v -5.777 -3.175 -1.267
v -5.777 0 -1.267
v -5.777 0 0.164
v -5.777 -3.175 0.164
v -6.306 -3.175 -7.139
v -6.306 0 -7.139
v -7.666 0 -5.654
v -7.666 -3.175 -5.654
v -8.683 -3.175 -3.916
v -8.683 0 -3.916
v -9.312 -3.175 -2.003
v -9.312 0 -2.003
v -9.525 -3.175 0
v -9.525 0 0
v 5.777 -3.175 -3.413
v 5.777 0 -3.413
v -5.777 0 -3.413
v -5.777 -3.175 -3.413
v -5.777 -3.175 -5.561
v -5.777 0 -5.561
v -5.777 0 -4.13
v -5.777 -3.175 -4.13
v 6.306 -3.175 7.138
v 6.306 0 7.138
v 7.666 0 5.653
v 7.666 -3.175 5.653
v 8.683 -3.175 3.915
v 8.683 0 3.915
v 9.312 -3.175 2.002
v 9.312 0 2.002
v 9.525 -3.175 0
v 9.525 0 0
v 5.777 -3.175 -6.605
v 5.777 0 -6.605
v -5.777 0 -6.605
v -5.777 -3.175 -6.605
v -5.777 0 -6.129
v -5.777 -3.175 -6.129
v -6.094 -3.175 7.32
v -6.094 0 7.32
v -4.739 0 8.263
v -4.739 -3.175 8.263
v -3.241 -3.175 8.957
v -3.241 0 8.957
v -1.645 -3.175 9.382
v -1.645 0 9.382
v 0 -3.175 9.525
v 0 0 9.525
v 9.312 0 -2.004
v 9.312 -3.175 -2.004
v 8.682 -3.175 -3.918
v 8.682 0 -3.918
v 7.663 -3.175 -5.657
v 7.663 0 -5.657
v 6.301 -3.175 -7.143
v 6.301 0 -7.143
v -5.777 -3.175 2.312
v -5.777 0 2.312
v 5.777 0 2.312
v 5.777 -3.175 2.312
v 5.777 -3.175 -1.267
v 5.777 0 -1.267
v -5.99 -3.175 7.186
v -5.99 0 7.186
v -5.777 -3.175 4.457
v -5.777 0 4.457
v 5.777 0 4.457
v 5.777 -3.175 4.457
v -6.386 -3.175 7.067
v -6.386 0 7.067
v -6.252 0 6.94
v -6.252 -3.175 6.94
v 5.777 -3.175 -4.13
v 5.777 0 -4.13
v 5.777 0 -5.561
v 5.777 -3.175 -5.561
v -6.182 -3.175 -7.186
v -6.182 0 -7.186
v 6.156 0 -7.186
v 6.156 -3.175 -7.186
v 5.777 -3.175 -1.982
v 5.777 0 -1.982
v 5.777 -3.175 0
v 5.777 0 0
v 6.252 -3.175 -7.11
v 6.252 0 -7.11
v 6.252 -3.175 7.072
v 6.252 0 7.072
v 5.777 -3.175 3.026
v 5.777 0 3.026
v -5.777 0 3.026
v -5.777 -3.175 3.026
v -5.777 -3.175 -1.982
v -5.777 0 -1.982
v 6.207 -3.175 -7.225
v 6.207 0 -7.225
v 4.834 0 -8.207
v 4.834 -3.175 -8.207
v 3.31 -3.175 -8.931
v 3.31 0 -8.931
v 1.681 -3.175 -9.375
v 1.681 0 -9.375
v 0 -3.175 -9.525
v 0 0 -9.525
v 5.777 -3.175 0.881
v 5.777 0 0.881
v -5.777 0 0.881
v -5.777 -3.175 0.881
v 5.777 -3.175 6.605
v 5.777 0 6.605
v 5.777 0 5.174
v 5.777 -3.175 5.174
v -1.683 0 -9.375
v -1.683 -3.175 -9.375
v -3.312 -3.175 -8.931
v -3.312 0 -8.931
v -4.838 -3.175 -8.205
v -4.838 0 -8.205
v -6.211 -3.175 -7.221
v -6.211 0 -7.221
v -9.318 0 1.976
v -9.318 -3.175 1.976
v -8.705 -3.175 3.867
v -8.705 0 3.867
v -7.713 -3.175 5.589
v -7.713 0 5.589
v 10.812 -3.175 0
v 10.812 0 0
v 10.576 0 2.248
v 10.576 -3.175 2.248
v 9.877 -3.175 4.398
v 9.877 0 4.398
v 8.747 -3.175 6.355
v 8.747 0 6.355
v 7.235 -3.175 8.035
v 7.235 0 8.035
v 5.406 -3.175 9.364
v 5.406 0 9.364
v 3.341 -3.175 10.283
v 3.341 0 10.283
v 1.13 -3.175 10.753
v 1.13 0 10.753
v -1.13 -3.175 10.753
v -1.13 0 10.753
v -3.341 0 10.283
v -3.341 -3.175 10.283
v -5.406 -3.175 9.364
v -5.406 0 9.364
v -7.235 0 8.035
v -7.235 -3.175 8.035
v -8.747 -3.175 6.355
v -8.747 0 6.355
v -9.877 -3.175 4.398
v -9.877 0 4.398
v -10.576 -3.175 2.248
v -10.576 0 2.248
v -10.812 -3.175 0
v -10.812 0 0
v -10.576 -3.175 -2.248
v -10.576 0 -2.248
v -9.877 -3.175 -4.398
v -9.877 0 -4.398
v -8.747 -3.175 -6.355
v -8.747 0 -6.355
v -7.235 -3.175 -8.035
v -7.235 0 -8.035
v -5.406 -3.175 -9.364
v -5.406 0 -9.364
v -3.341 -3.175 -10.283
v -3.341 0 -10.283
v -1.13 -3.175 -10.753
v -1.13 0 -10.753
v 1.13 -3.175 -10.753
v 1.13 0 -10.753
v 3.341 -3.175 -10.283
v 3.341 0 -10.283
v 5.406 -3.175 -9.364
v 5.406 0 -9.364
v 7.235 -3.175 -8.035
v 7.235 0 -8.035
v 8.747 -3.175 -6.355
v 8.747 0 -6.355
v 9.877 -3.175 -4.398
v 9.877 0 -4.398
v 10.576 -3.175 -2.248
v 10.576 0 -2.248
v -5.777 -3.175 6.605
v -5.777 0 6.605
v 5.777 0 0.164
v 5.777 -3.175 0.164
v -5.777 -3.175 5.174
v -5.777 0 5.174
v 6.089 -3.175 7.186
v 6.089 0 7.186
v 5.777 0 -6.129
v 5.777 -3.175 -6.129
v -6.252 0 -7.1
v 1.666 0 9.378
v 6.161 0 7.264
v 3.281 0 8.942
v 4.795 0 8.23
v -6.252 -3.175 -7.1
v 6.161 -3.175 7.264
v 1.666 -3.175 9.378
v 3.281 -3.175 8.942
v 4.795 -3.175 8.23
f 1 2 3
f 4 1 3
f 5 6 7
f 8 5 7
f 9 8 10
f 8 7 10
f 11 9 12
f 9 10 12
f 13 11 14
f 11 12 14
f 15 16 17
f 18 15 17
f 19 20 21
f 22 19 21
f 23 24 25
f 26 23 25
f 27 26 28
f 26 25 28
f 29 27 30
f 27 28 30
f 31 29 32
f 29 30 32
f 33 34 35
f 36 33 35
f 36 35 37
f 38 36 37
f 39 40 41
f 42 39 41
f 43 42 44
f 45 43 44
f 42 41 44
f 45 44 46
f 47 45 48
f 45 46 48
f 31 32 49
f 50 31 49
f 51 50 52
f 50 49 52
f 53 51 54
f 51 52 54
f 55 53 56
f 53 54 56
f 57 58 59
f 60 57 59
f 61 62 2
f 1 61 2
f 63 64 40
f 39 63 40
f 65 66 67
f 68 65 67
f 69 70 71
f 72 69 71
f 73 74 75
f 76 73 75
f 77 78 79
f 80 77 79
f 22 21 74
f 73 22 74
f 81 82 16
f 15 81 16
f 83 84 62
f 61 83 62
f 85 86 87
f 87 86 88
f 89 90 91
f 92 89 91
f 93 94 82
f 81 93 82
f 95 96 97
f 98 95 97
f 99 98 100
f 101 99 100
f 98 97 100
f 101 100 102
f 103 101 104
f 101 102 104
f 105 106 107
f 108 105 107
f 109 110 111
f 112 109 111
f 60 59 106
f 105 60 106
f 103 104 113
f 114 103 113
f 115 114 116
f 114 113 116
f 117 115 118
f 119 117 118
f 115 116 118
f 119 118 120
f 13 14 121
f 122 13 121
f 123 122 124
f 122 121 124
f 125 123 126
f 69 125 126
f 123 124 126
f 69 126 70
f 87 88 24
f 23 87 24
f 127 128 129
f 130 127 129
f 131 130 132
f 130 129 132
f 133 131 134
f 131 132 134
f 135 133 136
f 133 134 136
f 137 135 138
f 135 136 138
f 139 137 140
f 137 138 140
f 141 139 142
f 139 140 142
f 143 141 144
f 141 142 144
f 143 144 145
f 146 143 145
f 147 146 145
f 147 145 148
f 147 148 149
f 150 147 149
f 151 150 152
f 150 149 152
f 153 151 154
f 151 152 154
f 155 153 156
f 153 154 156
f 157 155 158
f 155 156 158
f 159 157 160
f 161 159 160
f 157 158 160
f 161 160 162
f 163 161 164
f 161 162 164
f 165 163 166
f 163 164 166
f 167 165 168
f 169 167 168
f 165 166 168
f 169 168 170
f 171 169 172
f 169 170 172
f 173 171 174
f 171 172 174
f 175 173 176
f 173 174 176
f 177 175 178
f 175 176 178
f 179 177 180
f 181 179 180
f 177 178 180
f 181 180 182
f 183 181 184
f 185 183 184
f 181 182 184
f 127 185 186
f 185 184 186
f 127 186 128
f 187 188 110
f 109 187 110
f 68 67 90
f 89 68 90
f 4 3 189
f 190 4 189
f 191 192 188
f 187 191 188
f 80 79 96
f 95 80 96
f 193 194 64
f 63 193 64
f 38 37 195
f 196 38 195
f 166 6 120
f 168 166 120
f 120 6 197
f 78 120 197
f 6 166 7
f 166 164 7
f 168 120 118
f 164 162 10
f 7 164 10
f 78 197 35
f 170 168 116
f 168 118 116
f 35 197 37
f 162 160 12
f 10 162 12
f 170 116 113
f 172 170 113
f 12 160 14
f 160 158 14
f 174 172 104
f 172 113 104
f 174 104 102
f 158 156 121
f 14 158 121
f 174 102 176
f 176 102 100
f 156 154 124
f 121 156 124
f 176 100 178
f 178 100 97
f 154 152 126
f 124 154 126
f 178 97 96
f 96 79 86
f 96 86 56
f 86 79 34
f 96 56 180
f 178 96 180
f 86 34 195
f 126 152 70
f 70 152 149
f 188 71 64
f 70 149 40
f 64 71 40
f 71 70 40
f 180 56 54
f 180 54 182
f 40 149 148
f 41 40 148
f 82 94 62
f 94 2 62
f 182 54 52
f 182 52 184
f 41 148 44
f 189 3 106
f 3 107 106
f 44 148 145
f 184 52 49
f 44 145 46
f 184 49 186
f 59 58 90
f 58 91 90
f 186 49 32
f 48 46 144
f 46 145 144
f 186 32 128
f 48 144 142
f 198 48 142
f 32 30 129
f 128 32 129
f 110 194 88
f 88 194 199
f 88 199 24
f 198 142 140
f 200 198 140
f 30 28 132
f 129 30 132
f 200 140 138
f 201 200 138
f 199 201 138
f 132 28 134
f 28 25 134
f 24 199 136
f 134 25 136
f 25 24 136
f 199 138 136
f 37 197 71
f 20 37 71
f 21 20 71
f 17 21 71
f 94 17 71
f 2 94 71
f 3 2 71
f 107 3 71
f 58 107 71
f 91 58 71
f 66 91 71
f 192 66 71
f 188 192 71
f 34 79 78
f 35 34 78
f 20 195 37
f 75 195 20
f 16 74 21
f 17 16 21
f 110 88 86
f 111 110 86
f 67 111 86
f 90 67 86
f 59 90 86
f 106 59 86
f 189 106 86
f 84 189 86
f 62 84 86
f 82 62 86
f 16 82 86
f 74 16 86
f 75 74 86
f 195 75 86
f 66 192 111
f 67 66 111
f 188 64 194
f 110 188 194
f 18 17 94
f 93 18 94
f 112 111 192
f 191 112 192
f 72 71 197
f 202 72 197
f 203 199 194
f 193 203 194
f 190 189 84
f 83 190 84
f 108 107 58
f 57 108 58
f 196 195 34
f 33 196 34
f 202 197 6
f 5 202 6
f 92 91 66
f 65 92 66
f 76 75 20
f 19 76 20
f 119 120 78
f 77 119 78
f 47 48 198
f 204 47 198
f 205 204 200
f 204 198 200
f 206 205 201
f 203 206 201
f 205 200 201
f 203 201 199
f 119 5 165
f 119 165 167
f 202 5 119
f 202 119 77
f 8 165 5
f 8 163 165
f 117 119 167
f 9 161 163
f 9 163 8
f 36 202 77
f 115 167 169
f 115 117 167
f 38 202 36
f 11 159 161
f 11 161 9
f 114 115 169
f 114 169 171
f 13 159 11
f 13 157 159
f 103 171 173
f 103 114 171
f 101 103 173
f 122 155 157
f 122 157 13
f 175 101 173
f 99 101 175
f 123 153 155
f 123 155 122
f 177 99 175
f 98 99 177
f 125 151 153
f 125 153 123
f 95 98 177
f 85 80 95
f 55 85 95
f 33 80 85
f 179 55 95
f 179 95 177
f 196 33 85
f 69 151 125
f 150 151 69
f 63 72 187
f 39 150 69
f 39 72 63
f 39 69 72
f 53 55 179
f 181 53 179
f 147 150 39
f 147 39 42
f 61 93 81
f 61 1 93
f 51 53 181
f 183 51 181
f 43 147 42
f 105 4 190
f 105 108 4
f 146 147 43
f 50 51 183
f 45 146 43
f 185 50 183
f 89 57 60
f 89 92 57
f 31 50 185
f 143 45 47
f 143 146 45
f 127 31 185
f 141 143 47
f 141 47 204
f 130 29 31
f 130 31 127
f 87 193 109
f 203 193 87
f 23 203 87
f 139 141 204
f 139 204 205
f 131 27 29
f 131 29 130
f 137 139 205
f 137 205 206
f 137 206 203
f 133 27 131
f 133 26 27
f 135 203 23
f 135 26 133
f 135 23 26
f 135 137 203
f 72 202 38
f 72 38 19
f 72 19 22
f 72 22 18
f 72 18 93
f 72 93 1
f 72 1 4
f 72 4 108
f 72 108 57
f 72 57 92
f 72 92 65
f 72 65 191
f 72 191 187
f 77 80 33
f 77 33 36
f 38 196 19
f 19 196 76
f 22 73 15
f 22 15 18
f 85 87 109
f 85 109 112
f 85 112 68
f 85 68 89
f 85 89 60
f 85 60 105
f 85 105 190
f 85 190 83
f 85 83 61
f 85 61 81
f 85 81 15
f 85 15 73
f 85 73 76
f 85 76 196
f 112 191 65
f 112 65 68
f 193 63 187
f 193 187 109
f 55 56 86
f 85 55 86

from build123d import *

# Parameters (mm, degrees)
F0_R     = 10.8121335874
F0_W     = 5.7772109285
F0_H     = 0.716982875
F0_H_2   = 0.7141863704
F0_H_3   = 0.5685804115
F1_DEPTH = 3.175


with BuildPart() as f1:
    # F0 (on Front) → F1 (new body)
    with BuildSketch(Plane.XZ):
        Circle(F0_R)
        with BuildLine():
            ThreePointArc((6.3062577959, 7.1383988129), (8.6831080411, 3.9152598569), (9.525, 0))
            ThreePointArc((9.525, 0), (8.6816518395, -3.9184877615), (6.3009482756, -7.1430858757))
            ThreePointArc((6.3009482756, -7.1430858757), (6.2763830489, -7.1646800922), (6.2517438163, -7.1861898288))
            ThreePointArc((6.2517438163, -7.1861898288), (6.2295179256, -7.205465385), (6.2072326042, -7.2246722))
            ThreePointArc((6.2072326042, -7.2246722), (3.3098808358, -8.9314228347), (0, -9.525))
            ThreePointArc((0, -9.525), (-3.3121824388, -8.9305695503), (-6.2109555135, -7.2214719143))
            ThreePointArc((-6.2109555135, -7.2214719143), (-6.2313746359, -7.2038597395), (-6.2517438163, -7.1861898288))
            ThreePointArc((-6.2517438163, -7.1861898288), (-6.2787205913, -7.1626316907), (-6.305608594, -7.1389722831))
            ThreePointArc((-6.305608594, -7.1389722831), (-8.6829300025, -3.9156546797), (-9.525, 0))
            ThreePointArc((-9.525, 0), (-8.7048463851, 3.8666877831), (-6.3856247955, 7.0674904295))
            ThreePointArc((-6.3856247955, 7.0674904295), (-6.3189630276, 7.1271544992), (-6.2517438163, 7.1861898288))
            ThreePointArc((-6.2517438163, 7.1861898288), (-6.1734679548, 7.2535452305), (-6.0944664659, 7.3200480529))
            ThreePointArc((-6.0944664659, 7.3200480529), (-3.2405375554, 8.9568153577), (0, 9.525))
            ThreePointArc((0, 9.525), (3.2811323241, 8.9420241373), (6.1606224546, 7.2644584087))
            ThreePointArc((6.1606224546, 7.2644584087), (6.2063065187, 7.2254677632), (6.2517438163, 7.1861898288))
            ThreePointArc((6.2517438163, 7.1861898288), (6.2790462746, 7.1623461855), (6.3062577959, 7.1383988129))
        make_face(mode=Mode.SUBTRACT)
        with Locations((-2.8886054642, 4.8158199061)):
            Rectangle(F0_W, F0_H)
        with Locations((2.8886054642, 4.8158199061)):
            Rectangle(F0_W, F0_H)
        with Locations((-2.8886054642, 0.5223121699)):
            Rectangle(F0_W, F0_H)
        with Locations((2.8886054642, 0.5223121699)):
            Rectangle(F0_W, F0_H)
        with Locations((2.8886054642, -3.7711955662)):
            Rectangle(F0_W, F0_H)
        with Locations((-2.8886054642, -3.7711955662)):
            Rectangle(F0_W, F0_H)
        with Locations((-2.8886054642, 2.669066038)):
            Rectangle(F0_W, F0_H_2)
        with Locations((2.8886054642, 2.669066038)):
            Rectangle(F0_W, F0_H_2)
        with Locations((-2.8886054642, -1.6244416981)):
            Rectangle(F0_W, F0_H_2)
        with Locations((2.8886054642, -1.6244416981)):
            Rectangle(F0_W, F0_H_2)
        Polygon((5.7772109285, 6.605480589), (6.2517438163, 7.1861898288), (6.0889851302, 7.1861898288), (0, 7.1861898288), (0, 6.605480589), align=None)
        Polygon((0, 6.605480589), (0, 7.1861898288), (-5.9895003214, 7.1861898288), (-6.2517438163, 7.1861898288), (-5.7772109285, 6.605480589), align=None)
        Polygon((-6.1821243726, -7.1861898288), (0, -7.1861898288), (0, -6.605480589), (-5.7772109285, -6.605480589), (-6.2517438163, -7.1861898288), align=None)
        Polygon((6.1562946066, -7.1861898288), (6.2517438163, -7.1861898288), (5.7772109285, -6.605480589), (0, -6.605480589), (0, -7.1861898288), align=None)
        with Locations((-2.8886054642, -5.8451464548)):
            Rectangle(F0_W, F0_H_3)
        with Locations((2.8886054642, -5.8451464548)):
            Rectangle(F0_W, F0_H_3)
        Polygon((6.2517438163, -7.1099842899), (6.2517438163, 0), (5.7772109285, 0), (5.7772109285, -0.5503656379), (5.7772109285, -1.2673485129), (5.7772109285, -1.9815348833), (5.7772109285, -2.6985177583), (5.7772109285, -3.4127041287), (5.7772109285, -4.1296870037), (5.7772109285, -4.843873374), (5.7772109285, -5.5608562491), (5.7772109285, -6.1294366606), (5.7772109285, -6.605480589), (6.2517438163, -7.1861898288), align=None)
        Polygon((5.7772109285, 0), (6.2517438163, 0), (6.2517438163, 7.0716873743), (6.2517438163, 7.1861898288), (5.7772109285, 6.605480589), (5.7772109285, 5.8884977139), (5.7772109285, 5.1743113436), (5.7772109285, 4.4573284686), (5.7772109285, 3.7431420982), (5.7772109285, 3.0261592232), (5.7772109285, 2.3119728528), (5.7772109285, 1.5949899778), (5.7772109285, 0.8808036075), (5.7772109285, 0.1638207324), align=None)
        Polygon((-6.2517438163, 0), (-5.7772109285, 0), (-5.7772109285, 0.1638207324), (-5.7772109285, 0.8808036075), (-5.7772109285, 1.5949899778), (-5.7772109285, 2.3119728528), (-5.7772109285, 3.0261592232), (-5.7772109285, 3.7431420982), (-5.7772109285, 4.4573284686), (-5.7772109285, 5.1743113436), (-5.7772109285, 5.8884977139), (-5.7772109285, 6.605480589), (-6.2517438163, 7.1861898288), (-6.2517438163, 6.9398786873), align=None)
        Polygon((-5.7772109285, -0.5503656379), (-5.7772109285, 0), (-6.2517438163, 0), (-6.2517438163, -7.1003455669), (-6.2517438163, -7.1861898288), (-5.7772109285, -6.605480589), (-5.7772109285, -6.1294366606), (-5.7772109285, -5.5608562491), (-5.7772109285, -4.843873374), (-5.7772109285, -4.1296870037), (-5.7772109285, -3.4127041287), (-5.7772109285, -2.6985177583), (-5.7772109285, -1.9815348833), (-5.7772109285, -1.2673485129), align=None)
        with BuildLine():
            Line((-5.9895003214, 7.1861898288), (-6.0944664659, 7.3200480529))
            ThreePointArc((-6.0944664659, 7.3200480529), (-6.1734679548, 7.2535452305), (-6.2517438163, 7.1861898288))
            Line((-6.2517438163, 7.1861898288), (-5.9895003214, 7.1861898288))
        make_face()
        with BuildLine():
            Line((-6.2517438163, 6.9398786873), (-6.2517438163, 7.1861898288))
            ThreePointArc((-6.2517438163, 7.1861898288), (-6.3189630276, 7.1271544992), (-6.3856247955, 7.0674904295))
            Line((-6.3856247955, 7.0674904295), (-6.2517438163, 6.9398786873))
        make_face()
        with BuildLine():
            Line((6.0889851302, 7.1861898288), (6.2517438163, 7.1861898288))
            ThreePointArc((6.2517438163, 7.1861898288), (6.2063065187, 7.2254677632), (6.1606224546, 7.2644584087))
            Line((6.1606224546, 7.2644584087), (6.0889851302, 7.1861898288))
        make_face()
        with BuildLine():
            Line((6.2517438163, 7.0716873743), (6.3062577959, 7.1383988129))
            ThreePointArc((6.3062577959, 7.1383988129), (6.2790462746, 7.1623461855), (6.2517438163, 7.1861898288))
            Line((6.2517438163, 7.1861898288), (6.2517438163, 7.0716873743))
        make_face()
        with BuildLine():
            ThreePointArc((-6.305608594, -7.1389722831), (-6.2787205913, -7.1626316907), (-6.2517438163, -7.1861898288))
            Line((-6.2517438163, -7.1861898288), (-6.2517438163, -7.1003455669))
            Line((-6.2517438163, -7.1003455669), (-6.305608594, -7.1389722831))
        make_face()
        with BuildLine():
            ThreePointArc((6.2517438163, -7.1861898288), (6.2763830489, -7.1646800922), (6.3009482756, -7.1430858757))
            Line((6.3009482756, -7.1430858757), (6.2517438163, -7.1099842899))
            Line((6.2517438163, -7.1099842899), (6.2517438163, -7.1861898288))
        make_face()
        with BuildLine():
            ThreePointArc((6.2072326042, -7.2246722), (6.2295179256, -7.205465385), (6.2517438163, -7.1861898288))
            Line((6.2517438163, -7.1861898288), (6.1562946066, -7.1861898288))
            Line((6.1562946066, -7.1861898288), (6.2072326042, -7.2246722))
        make_face()
        with BuildLine():
            ThreePointArc((-6.2517438163, -7.1861898288), (-6.2313746359, -7.2038597395), (-6.2109555135, -7.2214719143))
            Line((-6.2109555135, -7.2214719143), (-6.1821243726, -7.1861898288))
            Line((-6.1821243726, -7.1861898288), (-6.2517438163, -7.1861898288))
        make_face()
    extrude(amount=F1_DEPTH)


solid = f1.part
